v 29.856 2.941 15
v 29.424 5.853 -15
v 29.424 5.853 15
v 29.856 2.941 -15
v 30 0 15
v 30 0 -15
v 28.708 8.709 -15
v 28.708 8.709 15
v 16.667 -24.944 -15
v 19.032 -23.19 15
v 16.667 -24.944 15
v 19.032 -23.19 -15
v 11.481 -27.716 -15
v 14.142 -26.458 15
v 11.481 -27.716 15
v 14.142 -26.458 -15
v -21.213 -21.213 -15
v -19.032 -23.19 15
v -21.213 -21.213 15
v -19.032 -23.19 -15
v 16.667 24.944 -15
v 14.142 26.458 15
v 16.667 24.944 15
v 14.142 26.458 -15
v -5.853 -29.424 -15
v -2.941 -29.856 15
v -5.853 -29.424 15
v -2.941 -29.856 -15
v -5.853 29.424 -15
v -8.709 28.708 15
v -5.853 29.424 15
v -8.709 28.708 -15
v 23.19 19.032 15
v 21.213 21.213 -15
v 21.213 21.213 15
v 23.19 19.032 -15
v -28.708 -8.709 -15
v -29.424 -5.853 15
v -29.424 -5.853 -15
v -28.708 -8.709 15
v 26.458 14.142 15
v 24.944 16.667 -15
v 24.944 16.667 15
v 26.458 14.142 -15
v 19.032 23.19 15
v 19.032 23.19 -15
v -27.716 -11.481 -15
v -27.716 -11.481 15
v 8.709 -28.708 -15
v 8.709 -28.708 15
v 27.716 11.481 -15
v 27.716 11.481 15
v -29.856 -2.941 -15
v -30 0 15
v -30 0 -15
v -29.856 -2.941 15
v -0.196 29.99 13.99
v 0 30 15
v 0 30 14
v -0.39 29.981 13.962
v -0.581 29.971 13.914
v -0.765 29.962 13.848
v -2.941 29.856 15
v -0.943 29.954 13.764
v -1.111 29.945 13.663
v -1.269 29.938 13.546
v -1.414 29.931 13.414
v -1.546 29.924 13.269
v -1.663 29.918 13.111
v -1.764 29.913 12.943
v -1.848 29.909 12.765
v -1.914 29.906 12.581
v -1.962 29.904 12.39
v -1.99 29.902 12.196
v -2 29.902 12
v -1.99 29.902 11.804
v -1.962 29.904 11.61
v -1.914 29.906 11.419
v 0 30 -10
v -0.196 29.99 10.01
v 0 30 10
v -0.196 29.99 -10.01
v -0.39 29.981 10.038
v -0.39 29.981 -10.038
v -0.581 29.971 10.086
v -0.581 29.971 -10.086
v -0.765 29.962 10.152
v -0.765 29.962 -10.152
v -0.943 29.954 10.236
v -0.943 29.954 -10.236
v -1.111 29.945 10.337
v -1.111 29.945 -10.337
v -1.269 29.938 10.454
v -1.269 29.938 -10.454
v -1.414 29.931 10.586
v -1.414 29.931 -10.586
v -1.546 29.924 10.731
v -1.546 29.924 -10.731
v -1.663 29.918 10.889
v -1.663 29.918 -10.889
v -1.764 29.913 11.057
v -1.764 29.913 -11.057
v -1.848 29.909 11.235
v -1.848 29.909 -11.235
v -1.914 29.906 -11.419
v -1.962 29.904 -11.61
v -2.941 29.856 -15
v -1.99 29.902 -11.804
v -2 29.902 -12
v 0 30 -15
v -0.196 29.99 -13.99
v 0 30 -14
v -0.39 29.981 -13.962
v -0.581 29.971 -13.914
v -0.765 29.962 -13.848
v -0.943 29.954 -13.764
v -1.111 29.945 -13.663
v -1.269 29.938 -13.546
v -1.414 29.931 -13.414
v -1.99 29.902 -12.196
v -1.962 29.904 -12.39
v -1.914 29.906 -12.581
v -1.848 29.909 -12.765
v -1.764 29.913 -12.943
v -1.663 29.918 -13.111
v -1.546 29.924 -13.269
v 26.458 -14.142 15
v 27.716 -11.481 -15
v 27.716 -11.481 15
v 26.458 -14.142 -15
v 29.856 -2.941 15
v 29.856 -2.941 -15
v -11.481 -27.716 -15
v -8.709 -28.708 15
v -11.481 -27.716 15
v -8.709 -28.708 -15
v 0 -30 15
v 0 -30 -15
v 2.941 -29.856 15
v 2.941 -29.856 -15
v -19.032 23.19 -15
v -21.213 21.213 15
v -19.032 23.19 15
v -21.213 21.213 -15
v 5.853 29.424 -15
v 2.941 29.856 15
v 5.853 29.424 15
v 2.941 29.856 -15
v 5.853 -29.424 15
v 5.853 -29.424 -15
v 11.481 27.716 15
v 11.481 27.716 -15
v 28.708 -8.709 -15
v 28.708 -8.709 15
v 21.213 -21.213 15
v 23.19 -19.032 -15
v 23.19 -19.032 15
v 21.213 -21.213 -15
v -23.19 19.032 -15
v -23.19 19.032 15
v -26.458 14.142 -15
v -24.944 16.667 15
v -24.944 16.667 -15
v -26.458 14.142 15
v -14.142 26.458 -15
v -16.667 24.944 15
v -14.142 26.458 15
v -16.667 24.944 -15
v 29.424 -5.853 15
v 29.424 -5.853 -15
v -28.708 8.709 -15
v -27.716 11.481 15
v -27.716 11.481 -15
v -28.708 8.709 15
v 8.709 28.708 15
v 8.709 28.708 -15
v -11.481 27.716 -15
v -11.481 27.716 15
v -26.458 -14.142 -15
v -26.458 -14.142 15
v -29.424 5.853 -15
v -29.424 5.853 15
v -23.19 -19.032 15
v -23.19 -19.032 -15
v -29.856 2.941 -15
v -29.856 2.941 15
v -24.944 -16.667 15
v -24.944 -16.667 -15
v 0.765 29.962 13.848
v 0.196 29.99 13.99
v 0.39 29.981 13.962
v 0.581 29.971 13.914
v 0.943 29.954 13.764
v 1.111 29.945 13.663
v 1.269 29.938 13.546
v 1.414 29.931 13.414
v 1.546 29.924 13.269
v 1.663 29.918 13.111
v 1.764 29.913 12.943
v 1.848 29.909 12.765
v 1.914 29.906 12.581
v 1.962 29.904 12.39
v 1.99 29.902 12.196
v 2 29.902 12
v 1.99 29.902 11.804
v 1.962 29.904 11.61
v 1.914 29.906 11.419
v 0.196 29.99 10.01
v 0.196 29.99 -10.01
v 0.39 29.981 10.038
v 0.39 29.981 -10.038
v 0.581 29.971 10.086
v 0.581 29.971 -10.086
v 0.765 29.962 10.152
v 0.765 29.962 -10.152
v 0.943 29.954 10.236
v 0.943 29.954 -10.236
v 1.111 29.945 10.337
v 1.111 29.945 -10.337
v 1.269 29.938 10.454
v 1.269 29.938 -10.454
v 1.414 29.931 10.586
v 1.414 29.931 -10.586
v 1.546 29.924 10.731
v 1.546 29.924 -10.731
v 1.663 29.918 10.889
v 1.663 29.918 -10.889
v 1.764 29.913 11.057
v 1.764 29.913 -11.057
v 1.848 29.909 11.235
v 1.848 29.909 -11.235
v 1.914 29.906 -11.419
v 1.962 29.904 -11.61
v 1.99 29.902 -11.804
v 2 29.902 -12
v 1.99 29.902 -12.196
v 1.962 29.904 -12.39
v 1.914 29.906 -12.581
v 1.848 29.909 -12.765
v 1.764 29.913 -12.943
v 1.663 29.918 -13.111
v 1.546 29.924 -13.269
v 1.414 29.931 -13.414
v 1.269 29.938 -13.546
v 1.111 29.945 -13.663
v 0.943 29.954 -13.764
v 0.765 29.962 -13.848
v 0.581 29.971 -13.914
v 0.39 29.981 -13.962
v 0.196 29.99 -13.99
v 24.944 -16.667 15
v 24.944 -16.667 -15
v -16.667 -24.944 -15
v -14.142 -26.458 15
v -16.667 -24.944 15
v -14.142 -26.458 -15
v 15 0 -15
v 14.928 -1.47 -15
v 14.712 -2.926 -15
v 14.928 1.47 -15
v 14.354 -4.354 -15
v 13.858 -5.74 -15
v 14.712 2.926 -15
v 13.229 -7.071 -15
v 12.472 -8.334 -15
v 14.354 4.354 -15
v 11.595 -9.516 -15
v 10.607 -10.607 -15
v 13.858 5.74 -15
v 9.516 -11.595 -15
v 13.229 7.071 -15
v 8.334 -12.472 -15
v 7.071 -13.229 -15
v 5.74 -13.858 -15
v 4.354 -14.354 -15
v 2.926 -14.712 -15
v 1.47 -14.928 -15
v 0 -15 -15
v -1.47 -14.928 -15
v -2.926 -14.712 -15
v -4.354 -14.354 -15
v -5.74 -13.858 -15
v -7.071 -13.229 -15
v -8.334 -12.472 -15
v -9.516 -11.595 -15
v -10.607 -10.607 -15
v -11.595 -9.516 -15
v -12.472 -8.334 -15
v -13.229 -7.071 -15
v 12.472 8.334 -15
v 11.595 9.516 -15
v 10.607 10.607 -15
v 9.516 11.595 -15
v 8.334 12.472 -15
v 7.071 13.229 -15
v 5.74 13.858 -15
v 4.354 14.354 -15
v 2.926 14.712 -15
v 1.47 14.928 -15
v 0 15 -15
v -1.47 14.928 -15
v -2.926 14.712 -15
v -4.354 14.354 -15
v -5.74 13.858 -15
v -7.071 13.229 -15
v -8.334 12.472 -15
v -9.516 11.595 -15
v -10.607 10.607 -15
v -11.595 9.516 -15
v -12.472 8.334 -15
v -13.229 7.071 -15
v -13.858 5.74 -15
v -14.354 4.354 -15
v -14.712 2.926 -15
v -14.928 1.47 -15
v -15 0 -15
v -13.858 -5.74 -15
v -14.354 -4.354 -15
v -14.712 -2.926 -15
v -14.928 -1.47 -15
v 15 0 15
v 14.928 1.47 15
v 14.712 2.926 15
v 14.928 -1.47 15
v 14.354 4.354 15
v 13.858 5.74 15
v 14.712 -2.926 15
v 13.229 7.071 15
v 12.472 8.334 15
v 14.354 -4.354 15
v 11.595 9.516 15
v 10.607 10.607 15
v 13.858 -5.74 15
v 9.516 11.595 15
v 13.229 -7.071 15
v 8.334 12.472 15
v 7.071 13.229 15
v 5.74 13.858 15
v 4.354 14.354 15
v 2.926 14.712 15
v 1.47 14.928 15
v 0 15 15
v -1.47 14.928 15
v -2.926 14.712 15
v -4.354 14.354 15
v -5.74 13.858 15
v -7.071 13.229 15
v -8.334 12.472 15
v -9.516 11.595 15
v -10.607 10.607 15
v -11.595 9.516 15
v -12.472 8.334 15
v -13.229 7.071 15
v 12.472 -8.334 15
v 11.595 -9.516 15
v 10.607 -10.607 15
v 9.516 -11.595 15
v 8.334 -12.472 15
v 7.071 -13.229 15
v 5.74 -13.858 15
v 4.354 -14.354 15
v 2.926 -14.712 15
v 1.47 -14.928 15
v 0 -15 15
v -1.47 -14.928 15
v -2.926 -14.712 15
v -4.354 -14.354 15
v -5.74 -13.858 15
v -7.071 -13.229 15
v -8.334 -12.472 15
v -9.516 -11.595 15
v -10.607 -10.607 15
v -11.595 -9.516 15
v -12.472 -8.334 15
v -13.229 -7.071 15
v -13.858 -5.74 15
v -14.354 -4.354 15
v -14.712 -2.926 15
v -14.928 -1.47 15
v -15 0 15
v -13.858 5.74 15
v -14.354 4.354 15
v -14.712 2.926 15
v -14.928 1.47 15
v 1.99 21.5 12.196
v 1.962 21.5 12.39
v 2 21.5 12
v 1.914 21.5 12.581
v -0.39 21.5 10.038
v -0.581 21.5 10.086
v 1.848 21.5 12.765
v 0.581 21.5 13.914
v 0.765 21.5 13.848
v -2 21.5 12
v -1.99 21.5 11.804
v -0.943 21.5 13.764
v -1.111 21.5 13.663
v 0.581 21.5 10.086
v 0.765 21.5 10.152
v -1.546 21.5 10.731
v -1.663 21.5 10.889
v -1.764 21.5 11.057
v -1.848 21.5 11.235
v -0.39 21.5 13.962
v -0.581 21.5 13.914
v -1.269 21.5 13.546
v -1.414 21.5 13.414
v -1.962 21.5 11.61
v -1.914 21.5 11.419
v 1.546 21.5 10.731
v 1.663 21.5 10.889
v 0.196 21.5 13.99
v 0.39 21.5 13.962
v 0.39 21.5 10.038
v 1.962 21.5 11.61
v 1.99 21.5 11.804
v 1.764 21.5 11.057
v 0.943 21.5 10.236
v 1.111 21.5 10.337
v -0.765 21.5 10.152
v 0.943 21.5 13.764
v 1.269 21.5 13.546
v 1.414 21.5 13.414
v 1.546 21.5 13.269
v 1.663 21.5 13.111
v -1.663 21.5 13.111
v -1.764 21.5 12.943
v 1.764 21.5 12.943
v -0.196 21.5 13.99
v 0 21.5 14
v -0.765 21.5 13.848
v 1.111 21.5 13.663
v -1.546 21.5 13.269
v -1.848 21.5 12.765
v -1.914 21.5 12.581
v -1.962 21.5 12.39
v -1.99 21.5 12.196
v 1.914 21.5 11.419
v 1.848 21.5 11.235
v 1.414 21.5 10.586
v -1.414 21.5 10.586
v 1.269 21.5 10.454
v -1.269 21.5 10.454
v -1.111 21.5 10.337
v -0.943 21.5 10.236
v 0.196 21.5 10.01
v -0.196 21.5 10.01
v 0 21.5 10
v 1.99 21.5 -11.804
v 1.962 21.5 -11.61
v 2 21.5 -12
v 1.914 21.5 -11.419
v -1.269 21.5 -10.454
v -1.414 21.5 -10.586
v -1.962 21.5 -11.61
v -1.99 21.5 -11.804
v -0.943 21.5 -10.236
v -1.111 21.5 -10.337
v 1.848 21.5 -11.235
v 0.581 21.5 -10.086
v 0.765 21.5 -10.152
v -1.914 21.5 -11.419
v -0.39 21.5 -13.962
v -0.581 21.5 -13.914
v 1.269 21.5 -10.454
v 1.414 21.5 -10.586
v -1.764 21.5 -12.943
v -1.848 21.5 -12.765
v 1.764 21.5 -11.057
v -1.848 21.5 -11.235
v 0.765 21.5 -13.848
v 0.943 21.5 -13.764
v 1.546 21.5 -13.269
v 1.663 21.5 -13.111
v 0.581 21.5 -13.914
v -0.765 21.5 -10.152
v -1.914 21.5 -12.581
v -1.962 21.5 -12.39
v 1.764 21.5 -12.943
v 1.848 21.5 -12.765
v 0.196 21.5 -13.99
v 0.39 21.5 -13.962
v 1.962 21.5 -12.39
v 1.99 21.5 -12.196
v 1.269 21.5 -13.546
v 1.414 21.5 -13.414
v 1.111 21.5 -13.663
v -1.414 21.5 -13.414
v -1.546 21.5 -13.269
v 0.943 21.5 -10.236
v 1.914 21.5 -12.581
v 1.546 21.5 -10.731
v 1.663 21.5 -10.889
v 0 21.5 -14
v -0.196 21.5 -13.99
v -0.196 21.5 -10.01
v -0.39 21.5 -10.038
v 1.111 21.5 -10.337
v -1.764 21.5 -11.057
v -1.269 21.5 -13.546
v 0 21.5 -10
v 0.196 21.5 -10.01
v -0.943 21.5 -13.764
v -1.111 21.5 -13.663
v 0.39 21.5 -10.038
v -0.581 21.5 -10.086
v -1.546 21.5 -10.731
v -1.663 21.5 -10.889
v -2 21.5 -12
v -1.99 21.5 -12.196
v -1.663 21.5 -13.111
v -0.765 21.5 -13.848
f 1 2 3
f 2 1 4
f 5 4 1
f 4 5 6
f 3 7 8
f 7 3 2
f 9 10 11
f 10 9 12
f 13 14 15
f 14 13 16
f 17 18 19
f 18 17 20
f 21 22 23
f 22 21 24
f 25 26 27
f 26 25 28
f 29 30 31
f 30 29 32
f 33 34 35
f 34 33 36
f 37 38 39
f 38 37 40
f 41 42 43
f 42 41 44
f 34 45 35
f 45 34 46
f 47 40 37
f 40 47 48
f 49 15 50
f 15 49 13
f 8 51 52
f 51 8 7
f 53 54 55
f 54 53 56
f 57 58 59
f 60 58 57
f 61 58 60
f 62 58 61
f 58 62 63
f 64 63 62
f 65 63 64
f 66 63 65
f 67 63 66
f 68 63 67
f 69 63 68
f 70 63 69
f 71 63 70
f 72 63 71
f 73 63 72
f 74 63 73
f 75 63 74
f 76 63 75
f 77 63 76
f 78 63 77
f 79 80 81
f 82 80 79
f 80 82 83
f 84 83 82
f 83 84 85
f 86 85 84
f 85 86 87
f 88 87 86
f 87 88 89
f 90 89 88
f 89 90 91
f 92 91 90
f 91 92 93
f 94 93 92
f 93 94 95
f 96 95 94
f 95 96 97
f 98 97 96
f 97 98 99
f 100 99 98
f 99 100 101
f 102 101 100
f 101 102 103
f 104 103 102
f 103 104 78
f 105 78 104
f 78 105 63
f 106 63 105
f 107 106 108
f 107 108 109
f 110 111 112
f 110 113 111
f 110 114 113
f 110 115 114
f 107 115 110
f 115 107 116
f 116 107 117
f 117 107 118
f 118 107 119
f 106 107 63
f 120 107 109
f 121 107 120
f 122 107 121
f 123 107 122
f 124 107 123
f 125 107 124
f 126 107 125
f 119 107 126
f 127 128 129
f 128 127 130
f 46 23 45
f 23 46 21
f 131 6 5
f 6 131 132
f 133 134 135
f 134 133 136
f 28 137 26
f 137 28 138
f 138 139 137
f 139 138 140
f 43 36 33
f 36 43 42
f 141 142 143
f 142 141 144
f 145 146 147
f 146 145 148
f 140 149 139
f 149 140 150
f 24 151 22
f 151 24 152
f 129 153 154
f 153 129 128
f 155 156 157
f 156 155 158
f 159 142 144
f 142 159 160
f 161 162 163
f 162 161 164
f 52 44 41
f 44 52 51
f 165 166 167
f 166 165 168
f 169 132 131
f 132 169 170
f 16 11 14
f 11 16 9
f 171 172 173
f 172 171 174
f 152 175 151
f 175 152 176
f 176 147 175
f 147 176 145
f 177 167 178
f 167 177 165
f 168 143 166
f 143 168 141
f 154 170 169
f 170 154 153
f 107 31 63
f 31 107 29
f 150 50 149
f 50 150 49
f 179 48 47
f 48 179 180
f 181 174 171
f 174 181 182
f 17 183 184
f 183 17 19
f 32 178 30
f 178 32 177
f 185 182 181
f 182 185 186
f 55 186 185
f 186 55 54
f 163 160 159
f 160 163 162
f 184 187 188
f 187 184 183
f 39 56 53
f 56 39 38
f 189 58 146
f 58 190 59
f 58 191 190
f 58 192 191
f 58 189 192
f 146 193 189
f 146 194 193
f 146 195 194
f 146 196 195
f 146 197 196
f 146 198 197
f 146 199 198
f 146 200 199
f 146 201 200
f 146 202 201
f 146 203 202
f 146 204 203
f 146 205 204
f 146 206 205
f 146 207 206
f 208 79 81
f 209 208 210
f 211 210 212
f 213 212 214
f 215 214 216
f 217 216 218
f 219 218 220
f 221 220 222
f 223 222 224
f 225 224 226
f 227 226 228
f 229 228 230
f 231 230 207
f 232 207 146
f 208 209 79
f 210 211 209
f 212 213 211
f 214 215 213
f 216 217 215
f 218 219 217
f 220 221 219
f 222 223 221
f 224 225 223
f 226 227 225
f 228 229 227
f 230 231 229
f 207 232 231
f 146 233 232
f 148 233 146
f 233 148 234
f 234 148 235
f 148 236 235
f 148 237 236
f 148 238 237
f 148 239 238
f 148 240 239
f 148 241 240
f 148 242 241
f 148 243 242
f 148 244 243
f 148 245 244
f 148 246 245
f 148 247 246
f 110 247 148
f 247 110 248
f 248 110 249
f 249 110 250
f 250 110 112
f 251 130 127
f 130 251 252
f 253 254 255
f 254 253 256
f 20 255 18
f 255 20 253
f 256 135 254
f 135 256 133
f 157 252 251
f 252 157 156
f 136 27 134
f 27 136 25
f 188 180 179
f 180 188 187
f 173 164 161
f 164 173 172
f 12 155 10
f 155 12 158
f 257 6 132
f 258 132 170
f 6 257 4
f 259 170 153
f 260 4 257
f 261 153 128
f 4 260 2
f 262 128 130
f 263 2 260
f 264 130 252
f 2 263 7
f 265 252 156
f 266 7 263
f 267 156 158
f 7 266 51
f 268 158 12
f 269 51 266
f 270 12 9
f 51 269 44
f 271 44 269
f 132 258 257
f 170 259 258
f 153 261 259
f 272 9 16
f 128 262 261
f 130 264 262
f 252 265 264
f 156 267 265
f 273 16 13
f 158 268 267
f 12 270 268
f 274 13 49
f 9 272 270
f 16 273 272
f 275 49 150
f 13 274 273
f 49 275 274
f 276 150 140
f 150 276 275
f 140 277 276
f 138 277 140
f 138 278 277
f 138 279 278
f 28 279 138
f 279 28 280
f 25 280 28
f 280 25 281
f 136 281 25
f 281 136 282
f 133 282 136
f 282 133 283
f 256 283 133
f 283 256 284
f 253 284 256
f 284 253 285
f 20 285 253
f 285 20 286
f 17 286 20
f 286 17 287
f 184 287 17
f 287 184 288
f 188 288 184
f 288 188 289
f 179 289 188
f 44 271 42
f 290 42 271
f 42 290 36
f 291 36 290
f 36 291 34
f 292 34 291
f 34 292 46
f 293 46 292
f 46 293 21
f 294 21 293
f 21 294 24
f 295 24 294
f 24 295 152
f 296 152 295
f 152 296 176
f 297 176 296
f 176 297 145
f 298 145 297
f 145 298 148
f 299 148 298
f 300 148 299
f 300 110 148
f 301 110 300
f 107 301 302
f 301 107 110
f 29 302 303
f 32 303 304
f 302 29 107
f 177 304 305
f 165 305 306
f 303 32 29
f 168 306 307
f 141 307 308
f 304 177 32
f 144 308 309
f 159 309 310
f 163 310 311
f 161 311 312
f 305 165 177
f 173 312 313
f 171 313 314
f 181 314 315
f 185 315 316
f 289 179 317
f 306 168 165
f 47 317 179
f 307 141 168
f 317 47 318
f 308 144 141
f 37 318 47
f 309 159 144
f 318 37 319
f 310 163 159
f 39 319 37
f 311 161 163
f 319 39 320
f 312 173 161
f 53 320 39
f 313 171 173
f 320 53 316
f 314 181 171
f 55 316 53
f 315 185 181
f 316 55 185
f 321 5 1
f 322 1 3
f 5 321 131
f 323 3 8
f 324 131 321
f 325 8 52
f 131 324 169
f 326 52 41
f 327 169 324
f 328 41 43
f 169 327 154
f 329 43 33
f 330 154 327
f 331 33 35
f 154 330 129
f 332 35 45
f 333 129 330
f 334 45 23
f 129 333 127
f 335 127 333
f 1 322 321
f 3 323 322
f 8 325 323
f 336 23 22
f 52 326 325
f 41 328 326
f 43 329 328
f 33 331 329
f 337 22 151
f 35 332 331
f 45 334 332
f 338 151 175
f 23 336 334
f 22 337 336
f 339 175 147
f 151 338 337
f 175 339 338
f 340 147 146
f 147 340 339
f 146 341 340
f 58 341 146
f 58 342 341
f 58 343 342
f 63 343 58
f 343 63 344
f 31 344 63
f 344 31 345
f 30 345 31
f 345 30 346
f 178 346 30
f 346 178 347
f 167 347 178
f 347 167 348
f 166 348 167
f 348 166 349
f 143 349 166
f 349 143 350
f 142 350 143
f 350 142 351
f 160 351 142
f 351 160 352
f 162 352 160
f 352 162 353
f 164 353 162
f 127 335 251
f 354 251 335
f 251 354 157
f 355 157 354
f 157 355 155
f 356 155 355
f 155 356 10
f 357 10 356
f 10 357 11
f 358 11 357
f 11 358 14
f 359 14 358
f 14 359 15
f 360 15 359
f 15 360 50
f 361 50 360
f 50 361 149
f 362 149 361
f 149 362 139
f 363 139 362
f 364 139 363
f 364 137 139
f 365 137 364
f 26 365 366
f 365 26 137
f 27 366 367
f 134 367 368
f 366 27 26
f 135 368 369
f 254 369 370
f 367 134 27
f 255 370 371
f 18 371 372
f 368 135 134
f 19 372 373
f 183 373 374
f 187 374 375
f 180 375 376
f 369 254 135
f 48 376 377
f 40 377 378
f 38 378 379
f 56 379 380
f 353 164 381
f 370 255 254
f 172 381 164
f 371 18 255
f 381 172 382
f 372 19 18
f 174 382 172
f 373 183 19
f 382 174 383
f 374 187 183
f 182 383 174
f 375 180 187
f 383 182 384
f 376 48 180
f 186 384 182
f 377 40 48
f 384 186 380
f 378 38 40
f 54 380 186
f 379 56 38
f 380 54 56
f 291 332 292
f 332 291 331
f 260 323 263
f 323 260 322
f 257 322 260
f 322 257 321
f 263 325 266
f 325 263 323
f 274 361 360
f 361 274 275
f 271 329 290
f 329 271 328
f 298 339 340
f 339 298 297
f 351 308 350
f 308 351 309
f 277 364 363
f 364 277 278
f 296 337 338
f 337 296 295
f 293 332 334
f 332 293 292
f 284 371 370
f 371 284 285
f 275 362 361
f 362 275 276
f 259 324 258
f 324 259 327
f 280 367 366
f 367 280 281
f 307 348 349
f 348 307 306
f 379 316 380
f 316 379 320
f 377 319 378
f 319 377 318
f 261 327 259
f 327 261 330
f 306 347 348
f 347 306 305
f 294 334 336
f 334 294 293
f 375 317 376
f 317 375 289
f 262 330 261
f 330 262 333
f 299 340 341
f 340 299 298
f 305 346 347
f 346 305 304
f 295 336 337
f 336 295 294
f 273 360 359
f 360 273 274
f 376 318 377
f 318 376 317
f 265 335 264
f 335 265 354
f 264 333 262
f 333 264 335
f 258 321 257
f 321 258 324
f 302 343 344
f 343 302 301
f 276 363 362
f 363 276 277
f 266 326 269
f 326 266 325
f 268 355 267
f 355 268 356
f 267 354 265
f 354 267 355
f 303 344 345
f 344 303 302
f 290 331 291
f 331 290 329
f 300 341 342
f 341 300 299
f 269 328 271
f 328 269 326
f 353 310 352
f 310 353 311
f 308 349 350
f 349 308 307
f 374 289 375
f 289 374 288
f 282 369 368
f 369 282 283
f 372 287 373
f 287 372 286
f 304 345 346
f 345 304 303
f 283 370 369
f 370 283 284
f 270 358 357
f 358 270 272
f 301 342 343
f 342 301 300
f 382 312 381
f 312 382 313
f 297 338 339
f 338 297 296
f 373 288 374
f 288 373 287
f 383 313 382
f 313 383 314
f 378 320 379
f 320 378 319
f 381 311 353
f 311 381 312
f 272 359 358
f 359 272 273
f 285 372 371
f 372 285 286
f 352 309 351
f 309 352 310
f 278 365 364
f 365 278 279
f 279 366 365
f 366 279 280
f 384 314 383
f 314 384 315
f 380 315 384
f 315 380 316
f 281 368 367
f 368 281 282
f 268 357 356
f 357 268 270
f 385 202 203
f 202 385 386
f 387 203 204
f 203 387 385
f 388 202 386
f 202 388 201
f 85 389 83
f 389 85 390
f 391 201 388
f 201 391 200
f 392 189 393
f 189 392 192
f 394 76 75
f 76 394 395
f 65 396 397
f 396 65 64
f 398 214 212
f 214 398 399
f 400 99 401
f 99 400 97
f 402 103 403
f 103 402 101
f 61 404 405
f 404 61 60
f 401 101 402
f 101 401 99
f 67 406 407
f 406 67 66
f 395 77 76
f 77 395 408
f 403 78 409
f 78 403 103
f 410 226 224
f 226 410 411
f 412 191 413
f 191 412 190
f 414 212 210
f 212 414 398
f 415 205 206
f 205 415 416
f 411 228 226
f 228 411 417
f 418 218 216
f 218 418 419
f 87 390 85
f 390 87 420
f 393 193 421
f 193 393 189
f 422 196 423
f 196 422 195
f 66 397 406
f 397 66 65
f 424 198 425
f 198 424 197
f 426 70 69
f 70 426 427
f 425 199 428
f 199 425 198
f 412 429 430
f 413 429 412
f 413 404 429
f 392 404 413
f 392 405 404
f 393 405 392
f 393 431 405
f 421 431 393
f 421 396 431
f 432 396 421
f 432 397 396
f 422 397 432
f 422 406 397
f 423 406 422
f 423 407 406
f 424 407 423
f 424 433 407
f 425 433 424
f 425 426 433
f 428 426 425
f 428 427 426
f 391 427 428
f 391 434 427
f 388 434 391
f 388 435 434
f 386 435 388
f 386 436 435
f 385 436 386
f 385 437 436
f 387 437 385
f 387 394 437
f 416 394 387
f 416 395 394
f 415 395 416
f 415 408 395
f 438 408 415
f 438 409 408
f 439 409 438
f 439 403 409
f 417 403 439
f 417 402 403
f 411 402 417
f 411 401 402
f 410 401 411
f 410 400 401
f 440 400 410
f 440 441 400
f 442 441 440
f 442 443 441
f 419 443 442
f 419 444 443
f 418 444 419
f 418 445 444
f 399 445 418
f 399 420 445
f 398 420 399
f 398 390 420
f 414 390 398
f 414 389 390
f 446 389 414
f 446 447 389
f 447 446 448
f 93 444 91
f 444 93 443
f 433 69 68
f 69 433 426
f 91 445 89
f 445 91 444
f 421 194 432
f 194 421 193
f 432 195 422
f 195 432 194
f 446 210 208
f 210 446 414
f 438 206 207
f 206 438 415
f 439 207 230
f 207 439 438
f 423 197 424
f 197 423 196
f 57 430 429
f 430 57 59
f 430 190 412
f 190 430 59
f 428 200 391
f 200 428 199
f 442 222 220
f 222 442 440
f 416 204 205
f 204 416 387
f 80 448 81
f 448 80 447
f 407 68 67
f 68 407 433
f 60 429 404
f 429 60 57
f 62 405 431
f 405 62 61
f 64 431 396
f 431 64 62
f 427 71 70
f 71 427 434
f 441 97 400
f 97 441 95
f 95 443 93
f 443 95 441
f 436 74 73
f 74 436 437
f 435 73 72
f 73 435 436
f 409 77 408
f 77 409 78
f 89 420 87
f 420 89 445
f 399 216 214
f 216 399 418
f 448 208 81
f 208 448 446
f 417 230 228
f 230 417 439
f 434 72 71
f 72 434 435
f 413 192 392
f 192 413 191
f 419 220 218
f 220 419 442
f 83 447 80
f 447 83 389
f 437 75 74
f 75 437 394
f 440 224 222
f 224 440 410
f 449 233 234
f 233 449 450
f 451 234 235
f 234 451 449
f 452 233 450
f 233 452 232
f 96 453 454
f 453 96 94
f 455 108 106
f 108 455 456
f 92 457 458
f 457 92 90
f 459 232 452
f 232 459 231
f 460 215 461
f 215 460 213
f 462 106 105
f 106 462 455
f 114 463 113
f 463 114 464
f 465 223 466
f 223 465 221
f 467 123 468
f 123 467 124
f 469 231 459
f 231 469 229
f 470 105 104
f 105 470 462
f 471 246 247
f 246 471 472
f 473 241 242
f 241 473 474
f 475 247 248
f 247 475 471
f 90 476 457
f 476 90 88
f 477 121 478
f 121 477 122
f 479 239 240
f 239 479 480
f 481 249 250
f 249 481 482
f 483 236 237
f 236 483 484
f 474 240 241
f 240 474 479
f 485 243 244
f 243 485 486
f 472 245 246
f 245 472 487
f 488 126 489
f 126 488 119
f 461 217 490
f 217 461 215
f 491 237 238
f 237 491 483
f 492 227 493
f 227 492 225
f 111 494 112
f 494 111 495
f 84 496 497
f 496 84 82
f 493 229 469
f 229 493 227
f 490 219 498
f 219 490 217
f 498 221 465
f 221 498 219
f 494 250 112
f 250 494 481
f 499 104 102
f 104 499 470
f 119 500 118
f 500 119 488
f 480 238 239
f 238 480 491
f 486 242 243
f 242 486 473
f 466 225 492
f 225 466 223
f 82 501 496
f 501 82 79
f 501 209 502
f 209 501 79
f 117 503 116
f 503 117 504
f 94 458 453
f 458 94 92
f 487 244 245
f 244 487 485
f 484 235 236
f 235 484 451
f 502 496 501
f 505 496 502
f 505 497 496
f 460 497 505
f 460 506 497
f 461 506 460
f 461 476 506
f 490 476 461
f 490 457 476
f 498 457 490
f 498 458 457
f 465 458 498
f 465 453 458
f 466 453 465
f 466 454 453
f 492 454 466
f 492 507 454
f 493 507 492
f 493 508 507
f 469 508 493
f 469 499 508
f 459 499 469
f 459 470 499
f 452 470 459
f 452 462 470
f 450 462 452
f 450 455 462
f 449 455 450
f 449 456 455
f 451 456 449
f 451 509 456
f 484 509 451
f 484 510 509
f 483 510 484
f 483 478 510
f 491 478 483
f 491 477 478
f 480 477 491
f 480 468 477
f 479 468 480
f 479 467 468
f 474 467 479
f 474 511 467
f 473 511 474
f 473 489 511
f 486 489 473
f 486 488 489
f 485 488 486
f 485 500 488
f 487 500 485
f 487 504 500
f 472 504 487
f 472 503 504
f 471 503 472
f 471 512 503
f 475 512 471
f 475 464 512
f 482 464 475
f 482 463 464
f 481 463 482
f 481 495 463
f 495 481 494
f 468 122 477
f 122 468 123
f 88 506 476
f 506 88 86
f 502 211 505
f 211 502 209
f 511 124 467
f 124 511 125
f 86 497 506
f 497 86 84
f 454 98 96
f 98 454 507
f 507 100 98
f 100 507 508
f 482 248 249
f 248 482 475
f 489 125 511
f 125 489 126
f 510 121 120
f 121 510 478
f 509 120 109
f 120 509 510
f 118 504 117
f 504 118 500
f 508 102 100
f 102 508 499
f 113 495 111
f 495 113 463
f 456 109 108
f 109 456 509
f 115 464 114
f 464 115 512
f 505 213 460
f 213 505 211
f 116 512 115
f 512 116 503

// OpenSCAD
// COBRA Vertebra - C5 V4
// Height: 30.0mm, OD: 60.0mm

$fn = 64;

difference() {
    // Outer cylinder
    cylinder(h=30.0, d=60.0, center=true);
    
    // Inner channel
    cylinder(h=32.0, d=30.0, center=true);

    // Pivot holes
    translate([0, 30.0, 12.0])
    rotate([90, 0, 0])
    cylinder(h=17.0, d=4, center=true);
    
    translate([0, 30.0, -12.0])
    rotate([90, 0, 0])
    cylinder(h=17.0, d=4, center=true);
}
